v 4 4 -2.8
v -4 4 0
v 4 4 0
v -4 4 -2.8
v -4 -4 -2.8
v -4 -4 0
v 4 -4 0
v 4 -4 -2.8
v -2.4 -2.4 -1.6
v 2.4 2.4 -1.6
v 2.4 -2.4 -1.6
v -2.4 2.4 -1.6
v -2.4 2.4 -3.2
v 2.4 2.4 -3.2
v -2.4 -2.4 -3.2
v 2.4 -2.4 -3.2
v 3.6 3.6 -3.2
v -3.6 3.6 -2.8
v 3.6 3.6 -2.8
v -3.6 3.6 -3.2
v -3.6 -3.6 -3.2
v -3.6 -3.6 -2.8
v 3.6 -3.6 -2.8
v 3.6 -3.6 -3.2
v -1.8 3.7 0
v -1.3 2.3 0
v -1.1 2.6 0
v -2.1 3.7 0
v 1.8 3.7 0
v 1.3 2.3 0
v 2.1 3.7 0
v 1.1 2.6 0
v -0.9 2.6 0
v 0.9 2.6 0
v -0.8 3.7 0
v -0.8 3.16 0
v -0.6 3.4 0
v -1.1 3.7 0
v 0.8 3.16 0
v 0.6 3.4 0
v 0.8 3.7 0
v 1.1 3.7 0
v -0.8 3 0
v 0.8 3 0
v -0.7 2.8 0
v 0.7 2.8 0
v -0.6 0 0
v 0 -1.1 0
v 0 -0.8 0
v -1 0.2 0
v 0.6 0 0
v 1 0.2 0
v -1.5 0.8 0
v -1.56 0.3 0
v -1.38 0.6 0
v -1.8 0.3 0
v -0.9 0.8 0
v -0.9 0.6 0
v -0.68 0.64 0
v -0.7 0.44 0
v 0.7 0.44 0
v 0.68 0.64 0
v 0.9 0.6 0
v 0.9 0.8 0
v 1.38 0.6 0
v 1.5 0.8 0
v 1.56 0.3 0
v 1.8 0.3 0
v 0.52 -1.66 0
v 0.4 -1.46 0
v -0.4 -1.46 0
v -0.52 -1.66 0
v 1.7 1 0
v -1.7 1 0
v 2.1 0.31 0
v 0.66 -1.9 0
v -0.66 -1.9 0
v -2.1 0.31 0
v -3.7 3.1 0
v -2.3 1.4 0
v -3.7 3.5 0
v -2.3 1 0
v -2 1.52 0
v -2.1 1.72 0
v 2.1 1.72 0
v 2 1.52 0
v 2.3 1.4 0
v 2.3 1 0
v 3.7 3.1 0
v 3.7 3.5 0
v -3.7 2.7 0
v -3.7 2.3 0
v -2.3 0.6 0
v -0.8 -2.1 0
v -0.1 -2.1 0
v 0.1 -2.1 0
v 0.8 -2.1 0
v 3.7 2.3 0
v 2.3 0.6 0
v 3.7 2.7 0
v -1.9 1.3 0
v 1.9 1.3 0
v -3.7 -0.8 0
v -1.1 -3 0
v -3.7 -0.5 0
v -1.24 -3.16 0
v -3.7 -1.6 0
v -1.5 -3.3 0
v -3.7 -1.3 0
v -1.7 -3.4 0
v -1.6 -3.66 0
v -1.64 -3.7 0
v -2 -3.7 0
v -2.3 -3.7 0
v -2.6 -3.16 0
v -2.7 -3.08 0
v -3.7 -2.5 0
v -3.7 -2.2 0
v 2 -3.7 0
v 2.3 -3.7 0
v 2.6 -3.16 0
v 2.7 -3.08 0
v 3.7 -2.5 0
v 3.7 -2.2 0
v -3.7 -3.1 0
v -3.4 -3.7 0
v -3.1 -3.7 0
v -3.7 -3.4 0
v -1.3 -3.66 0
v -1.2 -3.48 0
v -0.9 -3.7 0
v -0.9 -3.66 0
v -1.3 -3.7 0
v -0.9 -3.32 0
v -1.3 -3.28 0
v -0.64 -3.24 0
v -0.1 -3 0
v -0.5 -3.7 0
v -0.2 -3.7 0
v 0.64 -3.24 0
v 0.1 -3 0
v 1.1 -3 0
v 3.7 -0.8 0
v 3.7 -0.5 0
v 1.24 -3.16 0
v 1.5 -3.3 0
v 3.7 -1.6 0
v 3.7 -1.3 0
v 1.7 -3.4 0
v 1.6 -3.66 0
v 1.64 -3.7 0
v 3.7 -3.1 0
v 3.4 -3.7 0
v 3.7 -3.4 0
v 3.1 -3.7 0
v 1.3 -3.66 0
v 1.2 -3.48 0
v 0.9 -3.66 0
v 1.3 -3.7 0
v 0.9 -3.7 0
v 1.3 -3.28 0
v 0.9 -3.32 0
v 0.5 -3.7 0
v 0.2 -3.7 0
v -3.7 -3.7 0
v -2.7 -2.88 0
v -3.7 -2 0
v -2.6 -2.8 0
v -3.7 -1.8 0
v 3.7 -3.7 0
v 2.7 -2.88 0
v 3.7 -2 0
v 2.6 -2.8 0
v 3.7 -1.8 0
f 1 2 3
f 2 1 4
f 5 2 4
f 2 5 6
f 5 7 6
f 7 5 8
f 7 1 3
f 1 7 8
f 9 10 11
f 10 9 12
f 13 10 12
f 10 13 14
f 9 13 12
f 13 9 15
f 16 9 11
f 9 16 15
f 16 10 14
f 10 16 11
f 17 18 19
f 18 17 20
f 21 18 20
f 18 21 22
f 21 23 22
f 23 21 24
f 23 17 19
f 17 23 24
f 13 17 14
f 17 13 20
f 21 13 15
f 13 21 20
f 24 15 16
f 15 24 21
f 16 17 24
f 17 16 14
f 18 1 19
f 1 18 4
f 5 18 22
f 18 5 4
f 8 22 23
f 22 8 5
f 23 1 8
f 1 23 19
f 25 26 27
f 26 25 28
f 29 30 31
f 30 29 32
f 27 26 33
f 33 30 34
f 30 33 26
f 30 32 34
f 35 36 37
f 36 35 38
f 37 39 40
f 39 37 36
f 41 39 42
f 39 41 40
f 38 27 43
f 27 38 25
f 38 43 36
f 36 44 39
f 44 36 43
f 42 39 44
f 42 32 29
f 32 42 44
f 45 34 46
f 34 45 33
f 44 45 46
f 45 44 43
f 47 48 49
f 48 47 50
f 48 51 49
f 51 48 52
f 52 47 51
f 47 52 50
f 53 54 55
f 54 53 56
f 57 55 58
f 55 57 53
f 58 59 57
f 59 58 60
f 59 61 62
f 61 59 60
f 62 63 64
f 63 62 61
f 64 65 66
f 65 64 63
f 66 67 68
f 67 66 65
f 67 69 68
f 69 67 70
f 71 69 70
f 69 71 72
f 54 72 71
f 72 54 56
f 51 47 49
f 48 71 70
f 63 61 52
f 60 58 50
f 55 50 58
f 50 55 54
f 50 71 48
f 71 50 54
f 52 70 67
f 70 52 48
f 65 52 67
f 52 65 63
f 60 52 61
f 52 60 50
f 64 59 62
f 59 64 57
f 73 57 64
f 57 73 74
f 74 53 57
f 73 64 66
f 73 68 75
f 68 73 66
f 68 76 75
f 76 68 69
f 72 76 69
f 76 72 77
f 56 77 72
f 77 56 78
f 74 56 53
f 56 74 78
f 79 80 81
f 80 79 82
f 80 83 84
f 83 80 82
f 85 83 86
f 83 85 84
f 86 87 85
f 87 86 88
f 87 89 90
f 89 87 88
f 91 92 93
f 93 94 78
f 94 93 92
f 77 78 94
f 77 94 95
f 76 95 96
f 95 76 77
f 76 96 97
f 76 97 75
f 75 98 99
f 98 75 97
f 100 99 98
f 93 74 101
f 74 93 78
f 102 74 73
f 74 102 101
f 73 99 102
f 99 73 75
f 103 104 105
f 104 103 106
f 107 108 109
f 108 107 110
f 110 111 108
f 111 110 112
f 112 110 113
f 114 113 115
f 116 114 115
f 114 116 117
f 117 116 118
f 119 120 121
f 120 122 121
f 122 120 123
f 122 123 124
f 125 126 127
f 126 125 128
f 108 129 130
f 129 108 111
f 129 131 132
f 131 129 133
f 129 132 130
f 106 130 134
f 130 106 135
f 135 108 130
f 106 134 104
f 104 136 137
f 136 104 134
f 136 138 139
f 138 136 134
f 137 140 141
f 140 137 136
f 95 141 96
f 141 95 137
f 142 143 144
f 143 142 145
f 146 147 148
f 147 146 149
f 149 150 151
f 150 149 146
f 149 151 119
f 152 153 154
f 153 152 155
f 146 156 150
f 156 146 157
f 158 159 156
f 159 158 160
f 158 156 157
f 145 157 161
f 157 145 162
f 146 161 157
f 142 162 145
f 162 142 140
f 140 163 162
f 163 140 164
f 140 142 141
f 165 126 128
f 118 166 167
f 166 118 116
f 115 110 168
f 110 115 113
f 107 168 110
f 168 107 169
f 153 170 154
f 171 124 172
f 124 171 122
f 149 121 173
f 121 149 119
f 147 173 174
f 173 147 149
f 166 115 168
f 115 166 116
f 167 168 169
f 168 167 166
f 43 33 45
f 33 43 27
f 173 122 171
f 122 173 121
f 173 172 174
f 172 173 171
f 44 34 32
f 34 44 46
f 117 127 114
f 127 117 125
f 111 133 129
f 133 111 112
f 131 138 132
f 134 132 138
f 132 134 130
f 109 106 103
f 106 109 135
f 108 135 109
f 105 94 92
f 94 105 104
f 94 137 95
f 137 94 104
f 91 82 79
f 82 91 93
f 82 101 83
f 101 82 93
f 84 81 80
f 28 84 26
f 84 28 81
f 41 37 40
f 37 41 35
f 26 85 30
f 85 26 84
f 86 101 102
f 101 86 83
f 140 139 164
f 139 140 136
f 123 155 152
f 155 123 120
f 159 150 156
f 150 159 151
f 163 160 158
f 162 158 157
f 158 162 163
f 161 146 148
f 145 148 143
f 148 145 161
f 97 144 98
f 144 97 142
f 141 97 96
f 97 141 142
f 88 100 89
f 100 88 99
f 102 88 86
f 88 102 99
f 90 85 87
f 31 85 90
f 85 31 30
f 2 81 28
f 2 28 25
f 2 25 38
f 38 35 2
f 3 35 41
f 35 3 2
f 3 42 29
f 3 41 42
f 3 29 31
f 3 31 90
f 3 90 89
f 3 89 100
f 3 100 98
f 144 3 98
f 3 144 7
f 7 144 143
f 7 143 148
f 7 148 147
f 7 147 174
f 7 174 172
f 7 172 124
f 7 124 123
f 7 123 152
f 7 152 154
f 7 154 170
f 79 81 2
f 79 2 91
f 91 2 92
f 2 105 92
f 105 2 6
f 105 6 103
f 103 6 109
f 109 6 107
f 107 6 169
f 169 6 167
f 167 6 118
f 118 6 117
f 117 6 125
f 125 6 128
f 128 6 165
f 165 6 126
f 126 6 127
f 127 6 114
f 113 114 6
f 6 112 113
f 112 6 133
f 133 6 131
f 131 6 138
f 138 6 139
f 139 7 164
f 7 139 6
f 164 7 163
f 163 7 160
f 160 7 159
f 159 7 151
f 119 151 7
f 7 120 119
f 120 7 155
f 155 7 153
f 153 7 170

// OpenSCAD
// file: ../p/box5.scad
use <../lib.scad>
function ldraw_lib__box5() = [
// 0 Box with 5 Faces and All Edges
// 0 Name: box5.dat
// 0 Author: James Jessiman
// 0 !LDRAW_ORG Primitive UPDATE 2012-01
// 0 !LICENSE Licensed under CC BY 2.0 and CC BY 4.0 : see CAreadme.txt
// 
// 0 BFC CERTIFY CCW
  [0,"BFC","CERTIFY"],
  [0,"BFC","CCW"],
// 
// 0 !HISTORY 2002-04-03 [sbliss] Modified for BFC compliance
// 0 !HISTORY 2002-04-25 [PTadmin] Official Update 2002-02
// 0 !HISTORY 2007-06-24 [PTadmin] Header formatted for Contributor Agreement
// 0 !HISTORY 2008-07-01 [PTadmin] Official Update 2008-01
// 0 !HISTORY 2012-02-16 [Philo] Changed to CCW
// 0 !HISTORY 2012-03-30 [PTadmin] Official Update 2012-01
// 
// 
// 2 24 1 1 1 -1 1 1
  [2,24,1,1,1,-1,1,1],
// 2 24 -1 1 1 -1 1 -1
  [2,24,-1,1,1,-1,1,-1],
// 2 24 -1 1 -1 1 1 -1
  [2,24,-1,1,-1,1,1,-1],
// 2 24 1 1 -1 1 1 1
  [2,24,1,1,-1,1,1,1],
// 2 24 1 0 1 -1 0 1
  [2,24,1,0,1,-1,0,1],
// 2 24 -1 0 1 -1 0 -1
  [2,24,-1,0,1,-1,0,-1],
// 2 24 -1 0 -1 1 0 -1
  [2,24,-1,0,-1,1,0,-1],
// 2 24 1 0 -1 1 0 1
  [2,24,1,0,-1,1,0,1],
// 2 24 1 0 1 1 1 1
  [2,24,1,0,1,1,1,1],
// 2 24 -1 0 1 -1 1 1
  [2,24,-1,0,1,-1,1,1],
// 2 24 1 0 -1 1 1 -1
  [2,24,1,0,-1,1,1,-1],
// 2 24 -1 0 -1 -1 1 -1
  [2,24,-1,0,-1,-1,1,-1],
// 4 16 -1 1 1 1 1 1 1 1 -1 -1 1 -1
  [4,16,-1,1,1,1,1,1,1,1,-1,-1,1,-1],
// 4 16 -1 1 1 -1 0 1 1 0 1 1 1 1
  [4,16,-1,1,1,-1,0,1,1,0,1,1,1,1],
// 4 16 -1 1 -1 -1 0 -1 -1 0 1 -1 1 1
  [4,16,-1,1,-1,-1,0,-1,-1,0,1,-1,1,1],
// 4 16 1 1 -1 1 0 -1 -1 0 -1 -1 1 -1
  [4,16,1,1,-1,1,0,-1,-1,0,-1,-1,1,-1],
// 4 16 1 1 1 1 0 1 1 0 -1 1 1 -1
  [4,16,1,1,1,1,0,1,1,0,-1,1,1,-1],
];
makepoly(ldraw_lib__box5(), line=0.2);
// file: ../p/box4.scad
use <../lib.scad>
function ldraw_lib__box4() = [
// 0 Box with 4 Faces (2 Parallel Pairs) and All Edges
// 0 Name: box4.dat
// 0 Author: James Jessiman
// 0 !LDRAW_ORG Primitive UPDATE 2012-01
// 0 !LICENSE Licensed under CC BY 2.0 and CC BY 4.0 : see CAreadme.txt
// 
// 0 BFC CERTIFY CCW
  [0,"BFC","CERTIFY"],
  [0,"BFC","CCW"],
// 
// 0 !HISTORY 2002-04-03 [sbliss] Modified for BFC compliance
// 0 !HISTORY 2002-04-25 [PTadmin] Official Update 2002-02
// 0 !HISTORY 2007-06-24 [PTadmin] Header formatted for Contributor Agreement
// 0 !HISTORY 2008-07-01 [PTadmin] Official Update 2008-01
// 0 !HISTORY 2012-02-16 [Philo] Changed to CCW
// 0 !HISTORY 2012-03-30 [PTadmin] Official Update 2012-01
// 
// 
// 2 24 1 1 1 -1 1 1
  [2,24,1,1,1,-1,1,1],
// 2 24 -1 1 1 -1 1 -1
  [2,24,-1,1,1,-1,1,-1],
// 2 24 -1 1 -1 1 1 -1
  [2,24,-1,1,-1,1,1,-1],
// 2 24 1 1 -1 1 1 1
  [2,24,1,1,-1,1,1,1],
// 2 24 1 0 1 -1 0 1
  [2,24,1,0,1,-1,0,1],
// 2 24 -1 0 1 -1 0 -1
  [2,24,-1,0,1,-1,0,-1],
// 2 24 -1 0 -1 1 0 -1
  [2,24,-1,0,-1,1,0,-1],
// 2 24 1 0 -1 1 0 1
  [2,24,1,0,-1,1,0,1],
// 2 24 1 0 1 1 1 1
  [2,24,1,0,1,1,1,1],
// 2 24 -1 0 1 -1 1 1
  [2,24,-1,0,1,-1,1,1],
// 2 24 1 0 -1 1 1 -1
  [2,24,1,0,-1,1,1,-1],
// 2 24 -1 0 -1 -1 1 -1
  [2,24,-1,0,-1,-1,1,-1],
// 4 16 -1 1 1 -1 0 1 1 0 1 1 1 1
  [4,16,-1,1,1,-1,0,1,1,0,1,1,1,1],
// 4 16 -1 1 -1 -1 0 -1 -1 0 1 -1 1 1
  [4,16,-1,1,-1,-1,0,-1,-1,0,1,-1,1,1],
// 4 16 1 1 -1 1 0 -1 -1 0 -1 -1 1 -1
  [4,16,1,1,-1,1,0,-1,-1,0,-1,-1,1,-1],
// 4 16 1 1 1 1 0 1 1 0 -1 1 1 -1
  [4,16,1,1,1,1,0,1,1,0,-1,1,1,-1],
];
makepoly(ldraw_lib__box4(), line=0.2);
// file: s/3070bs01.scad
use <../../lib.scad>
use <../../p/box4.scad>
use <../../p/box5.scad>
function ldraw_lib__s__3070bs01() = [
// 0 ~Tile  1 x  1 with Groove without Top Face
// 0 Name: s\3070bs01.dat
// 0 Author: Chris Dee [cwdee]
// 0 !LDRAW_ORG Subpart UPDATE 2009-02
// 0 !LICENSE Licensed under CC BY 2.0 and CC BY 4.0 : see CAreadme.txt
// 
// 0 BFC CERTIFY CCW
  [0,"BFC","CERTIFY"],
  [0,"BFC","CCW"],
// 
// 0 !HISTORY 2009-09-03 [PTadmin] Official Update 2009-02
// 
// 
// 1 16 0 0 0 10 0 0 0 7 0 0 0 10 box4.dat
  [1,16,0,0,0,10,0,0,0,7,0,0,0,10, ldraw_lib__box4()],
// 0 BFC INVERTNEXT
  [0,"BFC","INVERTNEXT"],
// 1 16 0 8 0 6 0 0 0 -4 0 0 0 6 box5.dat
  [1,16,0,8,0,6,0,0,0,-4,0,0,0,6, ldraw_lib__box5()],
// 1 16 0 7 0 9 0 0 0 1 0 0 0 9 box4.dat
  [1,16,0,7,0,9,0,0,0,1,0,0,0,9, ldraw_lib__box4()],
// 
// 4 16 9 8 9 6 8 6 -6 8 6 -9 8 9
  [4,16,9,8,9,6,8,6,-6,8,6,-9,8,9],
// 4 16 -9 8 9 -6 8 6 -6 8 -6 -9 8 -9
  [4,16,-9,8,9,-6,8,6,-6,8,-6,-9,8,-9],
// 4 16 -9 8 -9 -6 8 -6 6 8 -6 9 8 -9
  [4,16,-9,8,-9,-6,8,-6,6,8,-6,9,8,-9],
// 4 16 9 8 -9 6 8 -6 6 8 6 9 8 9
  [4,16,9,8,-9,6,8,-6,6,8,6,9,8,9],
// 
// 4 16 10 7 10 9 7 9 -9 7 9 -10 7 10
  [4,16,10,7,10,9,7,9,-9,7,9,-10,7,10],
// 4 16 -10 7 10 -9 7 9 -9 7 -9 -10 7 -10
  [4,16,-10,7,10,-9,7,9,-9,7,-9,-10,7,-10],
// 4 16 -10 7 -10 -9 7 -9 9 7 -9 10 7 -10
  [4,16,-10,7,-10,-9,7,-9,9,7,-9,10,7,-10],
// 4 16 10 7 -10 9 7 -9 9 7 9 10 7 10
  [4,16,10,7,-10,9,7,-9,9,7,9,10,7,10],
// 0
];
makepoly(ldraw_lib__s__3070bs01(), line=0.2);
// main file
use <../lib.scad>
use <s/3070bs01.scad>
function ldraw_lib__3070bpb0() = [
// 0 Tile  1 x  1 with Iron Man Armour and White Hexagonal Reactor Pattern
// 0 Name: 3070bpb0.dat
// 0 Author: Vincent Messenet [Cheenzo]
// 0 !LDRAW_ORG Part UPDATE 2020-03
// 0 !LICENSE Licensed under CC BY 2.0 and CC BY 4.0 : see CAreadme.txt
// 
// 0 BFC CERTIFY CCW
  [0,"BFC","CERTIFY"],
  [0,"BFC","CCW"],
// 
// 0 !KEYWORDS Armor, BrickLink 3070bpb094, Mark 33, MK XXXIII, Mk33, Set 5002946
// 0 !KEYWORDS Silver Centurion
// 
// 0 !HISTORY 2019-09-09 [PTadmin] Official Update 2019-02
// 0 !HISTORY 2020-11-14 [cwdee] Update description
// 0 !HISTORY 2020-12-29 [PTadmin] Official Update 2020-03
// 
// 
// 1 16 0 0 0 1 0 0 0 1 0 0 0 1 s\3070bs01.dat
  [1,16,0,0,0,1,0,0,0,1,0,0,0,1, ldraw_lib__s__3070bs01()],
// 
// 4 0 -2.75 0 6.5 -4.5 0 9.25 -5.25 0 9.25 -3.25 0 5.75
  [4,0,-2.75,0,6.5,-4.5,0,9.25,-5.25,0,9.25,-3.25,0,5.75],
// 4 0 5.25 0 9.25 4.5 0 9.25 2.75 0 6.5 3.25 0 5.75
  [4,0,5.25,0,9.25,4.5,0,9.25,2.75,0,6.5,3.25,0,5.75],
// 3 0 -2.75 0 6.5 -3.25 0 5.75 -2.25 0 6.5
  [3,0,-2.75,0,6.5,-3.25,0,5.75,-2.25,0,6.5],
// 4 0 2.25 0 6.5 -2.25 0 6.5 -3.25 0 5.75 3.25 0 5.75
  [4,0,2.25,0,6.5,-2.25,0,6.5,-3.25,0,5.75,3.25,0,5.75],
// 3 0 3.25 0 5.75 2.75 0 6.5 2.25 0 6.5
  [3,0,3.25,0,5.75,2.75,0,6.5,2.25,0,6.5],
// 4 0 -1.5 0 8.5 -2 0 9.25 -2.75 0 9.25 -2 0 7.9
  [4,0,-1.5,0,8.5,-2,0,9.25,-2.75,0,9.25,-2,0,7.9],
// 4 0 1.5 0 8.5 -1.5 0 8.5 -2 0 7.9 2 0 7.9
  [4,0,1.5,0,8.5,-1.5,0,8.5,-2,0,7.9,2,0,7.9],
// 4 0 1.5 0 8.5 2 0 7.9 2.75 0 9.25 2 0 9.25
  [4,0,1.5,0,8.5,2,0,7.9,2.75,0,9.25,2,0,9.25],
// 
// 4 71 -2 0 7.5 -2.75 0 9.25 -4.5 0 9.25 -2.75 0 6.5
  [4,71,-2,0,7.5,-2.75,0,9.25,-4.5,0,9.25,-2.75,0,6.5],
// 3 71 -2.75 0 9.25 -2 0 7.5 -2 0 7.9
  [3,71,-2.75,0,9.25,-2,0,7.5,-2,0,7.9],
// 4 71 -2 0 7.5 2 0 7.5 2 0 7.9 -2 0 7.9
  [4,71,-2,0,7.5,2,0,7.5,2,0,7.9,-2,0,7.9],
// 3 71 2.75 0 9.25 2 0 7.9 2 0 7.5
  [3,71,2.75,0,9.25,2,0,7.9,2,0,7.5],
// 4 71 2.75 0 9.25 2 0 7.5 2.75 0 6.5 4.5 0 9.25
  [4,71,2.75,0,9.25,2,0,7.5,2.75,0,6.5,4.5,0,9.25],
// 4 71 1.75 0 7 -1.75 0 7 -2.25 0 6.5 2.25 0 6.5
  [4,71,1.75,0,7,-1.75,0,7,-2.25,0,6.5,2.25,0,6.5],
// 
// 4 72 -2 0 7.5 -1.75 0 7 1.75 0 7 2 0 7.5
  [4,72,-2,0,7.5,-1.75,0,7,1.75,0,7,2,0,7.5],
// 
// 4 80 0 0 -2 -1.5 0 0 -2.5 0 .5 0 0 -2.75
  [4,80,0,0,-2,-1.5,0,0,-2.5,0,.5,0,0,-2.75],
// 4 80 1.5 0 0 0 0 -2 0 0 -2.75 2.5 0 .5
  [4,80,1.5,0,0,0,0,-2,0,0,-2.75,2.5,0,.5],
// 4 80 -1.5 0 0 1.5 0 0 2.5 0 .5 -2.5 0 .5
  [4,80,-1.5,0,0,1.5,0,0,2.5,0,.5,-2.5,0,.5],
// 4 80 -4.5 0 .75 -3.9 0 .75 -3.45 0 1.5 -3.75 0 2
  [4,80,-4.5,0,.75,-3.9,0,.75,-3.45,0,1.5,-3.75,0,2],
// 4 80 -3.75 0 2 -3.45 0 1.5 -2.25 0 1.5 -2.25 0 2
  [4,80,-3.75,0,2,-3.45,0,1.5,-2.25,0,1.5,-2.25,0,2],
// 4 80 -1.7 0 1.6 -2.25 0 2 -2.25 0 1.5 -1.75 0 1.1
  [4,80,-1.7,0,1.6,-2.25,0,2,-2.25,0,1.5,-1.75,0,1.1],
// 4 80 1.7 0 1.6 -1.7 0 1.6 -1.75 0 1.1 1.75 0 1.1
  [4,80,1.7,0,1.6,-1.7,0,1.6,-1.75,0,1.1,1.75,0,1.1],
// 4 80 1.7 0 1.6 1.75 0 1.1 2.25 0 1.5 2.25 0 2
  [4,80,1.7,0,1.6,1.75,0,1.1,2.25,0,1.5,2.25,0,2],
// 4 80 2.25 0 2 2.25 0 1.5 3.45 0 1.5 3.75 0 2
  [4,80,2.25,0,2,2.25,0,1.5,3.45,0,1.5,3.75,0,2],
// 4 80 3.75 0 2 3.45 0 1.5 3.9 0 .75 4.5 0 .75
  [4,80,3.75,0,2,3.45,0,1.5,3.9,0,.75,4.5,0,.75],
// 4 80 4.5 0 .75 3.9 0 .75 1 0 -3.65 1.3 0 -4.15
  [4,80,4.5,0,.75,3.9,0,.75,1,0,-3.65,1.3,0,-4.15],
// 4 80 -1.3 0 -4.15 1.3 0 -4.15 1 0 -3.65 -1 0 -3.65
  [4,80,-1.3,0,-4.15,1.3,0,-4.15,1,0,-3.65,-1,0,-3.65],
// 4 80 -1.3 0 -4.15 -1 0 -3.65 -3.9 0 .75 -4.5 0 .75
  [4,80,-1.3,0,-4.15,-1,0,-3.65,-3.9,0,.75,-4.5,0,.75],
// 
// 3 15 1.5 0 0 -1.5 0 0 0 0 -2
  [3,15,1.5,0,0,-1.5,0,0,0,0,-2],
// 3 15 0 0 -2.75 -1 0 -3.65 1 0 -3.65
  [3,15,0,0,-2.75,-1,0,-3.65,1,0,-3.65],
// 3 15 2.25 0 1.5 1.75 0 1.1 2.5 0 .5
  [3,15,2.25,0,1.5,1.75,0,1.1,2.5,0,.5],
// 3 15 -1.75 0 1.1 -2.25 0 1.5 -2.5 0 .5
  [3,15,-1.75,0,1.1,-2.25,0,1.5,-2.5,0,.5],
// 4 15 -2.25 0 1.5 -3.45 0 1.5 -3.9 0 .75 -2.5 0 .5
  [4,15,-2.25,0,1.5,-3.45,0,1.5,-3.9,0,.75,-2.5,0,.5],
// 4 15 0 0 -2.75 -2.5 0 .5 -3.9 0 .75 -1 0 -3.65
  [4,15,0,0,-2.75,-2.5,0,.5,-3.9,0,.75,-1,0,-3.65],
// 4 15 0 0 -2.75 1 0 -3.65 3.9 0 .75 2.5 0 .5
  [4,15,0,0,-2.75,1,0,-3.65,3.9,0,.75,2.5,0,.5],
// 4 15 2.5 0 .5 3.9 0 .75 3.45 0 1.5 2.25 0 1.5
  [4,15,2.5,0,.5,3.9,0,.75,3.45,0,1.5,2.25,0,1.5],
// 4 15 2.5 0 .5 1.75 0 1.1 -1.75 0 1.1 -2.5 0 .5
  [4,15,2.5,0,.5,1.75,0,1.1,-1.75,0,1.1,-2.5,0,.5],
// 4 15 -2.25 0 2 -1.7 0 1.6 1.7 0 1.6 2.25 0 2
  [4,15,-2.25,0,2,-1.7,0,1.6,1.7,0,1.6,2.25,0,2],
// 4 15 -4.25 0 2.5 -2.25 0 2 2.25 0 2 4.25 0 2.5
  [4,15,-4.25,0,2.5,-2.25,0,2,2.25,0,2,4.25,0,2.5],
// 3 15 -4.25 0 2.5 -3.75 0 2 -2.25 0 2
  [3,15,-4.25,0,2.5,-3.75,0,2,-2.25,0,2],
// 3 15 4.25 0 2.5 2.25 0 2 3.75 0 2
  [3,15,4.25,0,2.5,2.25,0,2,3.75,0,2],
// 4 15 4.25 0 2.5 3.75 0 2 4.5 0 .75 5.25 0 .775
  [4,15,4.25,0,2.5,3.75,0,2,4.5,0,.75,5.25,0,.775],
// 4 15 5.25 0 .775 4.5 0 .75 1.3 0 -4.15 1.65 0 -4.75
  [4,15,5.25,0,.775,4.5,0,.75,1.3,0,-4.15,1.65,0,-4.75],
// 4 15 -1.65 0 -4.75 1.65 0 -4.75 1.3 0 -4.15 -1.3 0 -4.15
  [4,15,-1.65,0,-4.75,1.65,0,-4.75,1.3,0,-4.15,-1.3,0,-4.15],
// 4 15 -1.65 0 -4.75 -1.3 0 -4.15 -4.5 0 .75 -5.25 0 .775
  [4,15,-1.65,0,-4.75,-1.3,0,-4.15,-4.5,0,.75,-5.25,0,.775],
// 4 15 -5.25 0 .775 -4.5 0 .75 -3.75 0 2 -4.25 0 2.5
  [4,15,-5.25,0,.775,-4.5,0,.75,-3.75,0,2,-4.25,0,2.5],
// 
// 4 0 -9.25 0 8.75 -9.25 0 7.75 -5.75 0 2.5 -5.75 0 3.5
  [4,0,-9.25,0,8.75,-9.25,0,7.75,-5.75,0,2.5,-5.75,0,3.5],
// 4 0 -5.25 0 4.3 -5.75 0 3.5 -5.75 0 2.5 -5 0 3.8
  [4,0,-5.25,0,4.3,-5.75,0,3.5,-5.75,0,2.5,-5,0,3.8],
// 4 0 -5.25 0 4.3 -5 0 3.8 5 0 3.8 5.25 0 4.3
  [4,0,-5.25,0,4.3,-5,0,3.8,5,0,3.8,5.25,0,4.3],
// 4 0 5.75 0 3.5 5.25 0 4.3 5 0 3.8 5.75 0 2.5
  [4,0,5.75,0,3.5,5.25,0,4.3,5,0,3.8,5.75,0,2.5],
// 4 0 5.75 0 2.5 9.25 0 7.75 9.25 0 8.75 5.75 0 3.5
  [4,0,5.75,0,2.5,9.25,0,7.75,9.25,0,8.75,5.75,0,3.5],
// 3 0 -9.25 0 6.75 -9.25 0 5.75 -5.75 0 1.5
  [3,0,-9.25,0,6.75,-9.25,0,5.75,-5.75,0,1.5],
// 4 0 -5.25 0 .775 -5.75 0 1.5 -9.25 0 5.75 -2 0 -5.25
  [4,0,-5.25,0,.775,-5.75,0,1.5,-9.25,0,5.75,-2,0,-5.25],
// 3 0 -1.65 0 -4.75 -5.25 0 .775 -2 0 -5.25
  [3,0,-1.65,0,-4.75,-5.25,0,.775,-2,0,-5.25],
// 3 0 -1.65 0 -4.75 -2 0 -5.25 -.25 0 -5.25
  [3,0,-1.65,0,-4.75,-2,0,-5.25,-.25,0,-5.25],
// 4 0 -1.65 0 -4.75 -.25 0 -5.25 .25 0 -5.25 1.65 0 -4.75
  [4,0,-1.65,0,-4.75,-.25,0,-5.25,.25,0,-5.25,1.65,0,-4.75],
// 3 0 1.65 0 -4.75 .25 0 -5.25 2 0 -5.25
  [3,0,1.65,0,-4.75,.25,0,-5.25,2,0,-5.25],
// 3 0 1.65 0 -4.75 2 0 -5.25 5.25 0 .775
  [3,0,1.65,0,-4.75,2,0,-5.25,5.25,0,.775],
// 4 0 5.75 0 1.5 5.25 0 .775 2 0 -5.25 9.25 0 5.75
  [4,0,5.75,0,1.5,5.25,0,.775,2,0,-5.25,9.25,0,5.75],
// 3 0 9.25 0 6.75 5.75 0 1.5 9.25 0 5.75
  [3,0,9.25,0,6.75,5.75,0,1.5,9.25,0,5.75],
// 4 0 -4.75 0 3.25 -5.75 0 1.5 -5.25 0 .775 -4.25 0 2.5
  [4,0,-4.75,0,3.25,-5.75,0,1.5,-5.25,0,.775,-4.25,0,2.5],
// 4 0 -4.75 0 3.25 -4.25 0 2.5 4.25 0 2.5 4.75 0 3.25
  [4,0,-4.75,0,3.25,-4.25,0,2.5,4.25,0,2.5,4.75,0,3.25],
// 4 0 4.25 0 2.5 5.25 0 .775 5.75 0 1.5 4.75 0 3.25
  [4,0,4.25,0,2.5,5.25,0,.775,5.75,0,1.5,4.75,0,3.25],
// 4 0 -9.25 0 -1.25 -9.25 0 -2 -3.1 0 -7.9 -2.75 0 -7.5
  [4,0,-9.25,0,-1.25,-9.25,0,-2,-3.1,0,-7.9,-2.75,0,-7.5],
// 4 0 -9.25 0 -3.25 -9.25 0 -4 -4.25 0 -8.5 -3.75 0 -8.25
  [4,0,-9.25,0,-3.25,-9.25,0,-4,-4.25,0,-8.5,-3.75,0,-8.25],
// 4 0 -4.1 0 -9.25 -4 0 -9.15 -3.75 0 -8.25 -4.25 0 -8.5
  [4,0,-4.1,0,-9.25,-4,0,-9.15,-3.75,0,-8.25,-4.25,0,-8.5],
// 3 0 -4.1 0 -9.25 -4.25 0 -8.5 -5 0 -9.25
  [3,0,-4.1,0,-9.25,-4.25,0,-8.5,-5,0,-9.25],
// 3 0 -5.75 0 -9.25 -5 0 -9.25 -6.5 0 -7.9
  [3,0,-5.75,0,-9.25,-5,0,-9.25,-6.5,0,-7.9],
// 4 0 -9.25 0 -6.25 -5.75 0 -9.25 -6.5 0 -7.9 -6.75 0 -7.7
  [4,0,-9.25,0,-6.25,-5.75,0,-9.25,-6.5,0,-7.9,-6.75,0,-7.7],
// 3 0 -9.25 0 -6.25 -6.75 0 -7.7 -9.25 0 -5.5
  [3,0,-9.25,0,-6.25,-6.75,0,-7.7,-9.25,0,-5.5],
// 3 0 5 0 -9.25 5.75 0 -9.25 6.5 0 -7.9
  [3,0,5,0,-9.25,5.75,0,-9.25,6.5,0,-7.9],
// 4 0 6.5 0 -7.9 5.75 0 -9.25 9.25 0 -6.25 6.75 0 -7.7
  [4,0,6.5,0,-7.9,5.75,0,-9.25,9.25,0,-6.25,6.75,0,-7.7],
// 3 0 6.75 0 -7.7 9.25 0 -6.25 9.25 0 -5.5
  [3,0,6.75,0,-7.7,9.25,0,-6.25,9.25,0,-5.5],
// 4 0 -7.75 0 -9.25 -9.25 0 -7.75 -9.25 0 -8.5 -8.5 0 -9.25
  [4,0,-7.75,0,-9.25,-9.25,0,-7.75,-9.25,0,-8.5,-8.5,0,-9.25],
// 4 0 -3 0 -8.7 -3.75 0 -8.25 -4 0 -9.15 -3.25 0 -9.15
  [4,0,-3,0,-8.7,-3.75,0,-8.25,-4,0,-9.15,-3.25,0,-9.15],
// 4 0 -3.25 0 -9.15 -3.25 0 -9.25 -2.25 0 -9.25 -2.25 0 -9.15
  [4,0,-3.25,0,-9.15,-3.25,0,-9.25,-2.25,0,-9.25,-2.25,0,-9.15],
// 3 0 -3.25 0 -9.15 -2.25 0 -9.15 -3 0 -8.7
  [3,0,-3.25,0,-9.15,-2.25,0,-9.15,-3,0,-8.7],
// 4 0 -3.1 0 -7.9 -3.25 0 -8.2 -3 0 -8.7 -2.25 0 -8.3
  [4,0,-3.1,0,-7.9,-3.25,0,-8.2,-3,0,-8.7,-2.25,0,-8.3],
// 3 0 -3.25 0 -8.2 -3.75 0 -8.25 -3 0 -8.7
  [3,0,-3.25,0,-8.2,-3.75,0,-8.25,-3,0,-8.7],
// 3 0 -3.1 0 -7.9 -2.25 0 -8.3 -2.75 0 -7.5
  [3,0,-3.1,0,-7.9,-2.25,0,-8.3,-2.75,0,-7.5],
// 4 0 -.25 0 -7.5 -2.75 0 -7.5 -2.25 0 -8.3 -1.6 0 -8.1
  [4,0,-.25,0,-7.5,-2.75,0,-7.5,-2.25,0,-8.3,-1.6,0,-8.1],
// 4 0 -.5 0 -9.25 -1.6 0 -8.1 -2.25 0 -8.3 -1.25 0 -9.25
  [4,0,-.5,0,-9.25,-1.6,0,-8.1,-2.25,0,-8.3,-1.25,0,-9.25],
// 4 0 .25 0 -7.5 -.25 0 -7.5 -1.6 0 -8.1 1.6 0 -8.1
  [4,0,.25,0,-7.5,-.25,0,-7.5,-1.6,0,-8.1,1.6,0,-8.1],
// 4 0 -.25 0 -5.25 -.25 0 -7.5 .25 0 -7.5 .25 0 -5.25
  [4,0,-.25,0,-5.25,-.25,0,-7.5,.25,0,-7.5,.25,0,-5.25],
// 4 0 3.1 0 -7.9 9.25 0 -2 9.25 0 -1.25 2.75 0 -7.5
  [4,0,3.1,0,-7.9,9.25,0,-2,9.25,0,-1.25,2.75,0,-7.5],
// 4 0 4.25 0 -8.5 9.25 0 -4 9.25 0 -3.25 3.75 0 -8.25
  [4,0,4.25,0,-8.5,9.25,0,-4,9.25,0,-3.25,3.75,0,-8.25],
// 4 0 3.75 0 -8.25 4 0 -9.15 4.1 0 -9.25 4.25 0 -8.5
  [4,0,3.75,0,-8.25,4,0,-9.15,4.1,0,-9.25,4.25,0,-8.5],
// 3 0 4.25 0 -8.5 4.1 0 -9.25 5 0 -9.25
  [3,0,4.25,0,-8.5,4.1,0,-9.25,5,0,-9.25],
// 4 0 9.25 0 -8.5 9.25 0 -7.75 7.75 0 -9.25 8.5 0 -9.25
  [4,0,9.25,0,-8.5,9.25,0,-7.75,7.75,0,-9.25,8.5,0,-9.25],
// 4 0 4 0 -9.15 3.75 0 -8.25 3 0 -8.7 3.25 0 -9.15
  [4,0,4,0,-9.15,3.75,0,-8.25,3,0,-8.7,3.25,0,-9.15],
// 4 0 2.25 0 -9.25 3.25 0 -9.25 3.25 0 -9.15 2.25 0 -9.15
  [4,0,2.25,0,-9.25,3.25,0,-9.25,3.25,0,-9.15,2.25,0,-9.15],
// 3 0 2.25 0 -9.15 3.25 0 -9.15 3 0 -8.7
  [3,0,2.25,0,-9.15,3.25,0,-9.15,3,0,-8.7],
// 4 0 3 0 -8.7 3.25 0 -8.2 3.1 0 -7.9 2.25 0 -8.3
  [4,0,3,0,-8.7,3.25,0,-8.2,3.1,0,-7.9,2.25,0,-8.3],
// 3 0 3.75 0 -8.25 3.25 0 -8.2 3 0 -8.7
  [3,0,3.75,0,-8.25,3.25,0,-8.2,3,0,-8.7],
// 4 0 3.1 0 -7.9 2.75 0 -7.5 1.6 0 -8.1 2.25 0 -8.3
  [4,0,3.1,0,-7.9,2.75,0,-7.5,1.6,0,-8.1,2.25,0,-8.3],
// 4 0 2.25 0 -8.3 1.6 0 -8.1 .5 0 -9.25 1.25 0 -9.25
  [4,0,2.25,0,-8.3,1.6,0,-8.1,.5,0,-9.25,1.25,0,-9.25],
// 3 0 1.6 0 -8.1 2.75 0 -7.5 .25 0 -7.5
  [3,0,1.6,0,-8.1,2.75,0,-7.5,.25,0,-7.5],
// 
// 3 71 -9.25 0 -9.25 -8.5 0 -9.25 -9.25 0 -8.5
  [3,71,-9.25,0,-9.25,-8.5,0,-9.25,-9.25,0,-8.5],
// 4 71 -9.25 0 -5 -9.25 0 -5.5 -6.75 0 -7.7 -6.75 0 -7.2
  [4,71,-9.25,0,-5,-9.25,0,-5.5,-6.75,0,-7.7,-6.75,0,-7.2],
// 4 71 -6.5 0 -7 -6.5 0 -7.9 -5 0 -9.25 -4.25 0 -8.5
  [4,71,-6.5,0,-7,-6.5,0,-7.9,-5,0,-9.25,-4.25,0,-8.5],
// 4 71 -9.25 0 -4 -9.25 0 -4.5 -6.5 0 -7 -4.25 0 -8.5
  [4,71,-9.25,0,-4,-9.25,0,-4.5,-6.5,0,-7,-4.25,0,-8.5],
// 3 71 8.5 0 -9.25 9.25 0 -9.25 9.25 0 -8.5
  [3,71,8.5,0,-9.25,9.25,0,-9.25,9.25,0,-8.5],
// 4 71 6.75 0 -7.7 9.25 0 -5.5 9.25 0 -5 6.75 0 -7.2
  [4,71,6.75,0,-7.7,9.25,0,-5.5,9.25,0,-5,6.75,0,-7.2],
// 4 71 5 0 -9.25 6.5 0 -7.9 6.5 0 -7 4.25 0 -8.5
  [4,71,5,0,-9.25,6.5,0,-7.9,6.5,0,-7,4.25,0,-8.5],
// 4 71 6.5 0 -7 9.25 0 -4.5 9.25 0 -4 4.25 0 -8.5
  [4,71,6.5,0,-7,9.25,0,-4.5,9.25,0,-4,4.25,0,-8.5],
// 
// 4 72 -6.5 0 -7 -6.75 0 -7.2 -6.75 0 -7.7 -6.5 0 -7.9
  [4,72,-6.5,0,-7,-6.75,0,-7.2,-6.75,0,-7.7,-6.5,0,-7.9],
// 4 72 -9.25 0 -5 -6.75 0 -7.2 -6.5 0 -7 -9.25 0 -4.5
  [4,72,-9.25,0,-5,-6.75,0,-7.2,-6.5,0,-7,-9.25,0,-4.5],
// 4 72 -2 0 7.5 -2.75 0 6.5 -2.25 0 6.5 -1.75 0 7
  [4,72,-2,0,7.5,-2.75,0,6.5,-2.25,0,6.5,-1.75,0,7],
// 4 72 6.75 0 -7.7 6.75 0 -7.2 6.5 0 -7 6.5 0 -7.9
  [4,72,6.75,0,-7.7,6.75,0,-7.2,6.5,0,-7,6.5,0,-7.9],
// 4 72 6.5 0 -7 6.75 0 -7.2 9.25 0 -5 9.25 0 -4.5
  [4,72,6.5,0,-7,6.75,0,-7.2,9.25,0,-5,9.25,0,-4.5],
// 4 72 2 0 7.5 1.75 0 7 2.25 0 6.5 2.75 0 6.5
  [4,72,2,0,7.5,1.75,0,7,2.25,0,6.5,2.75,0,6.5],
// 
// 4 16 -9.25 0 -7.75 -7.75 0 -9.25 -5.75 0 -9.25 -9.25 0 -6.25
  [4,16,-9.25,0,-7.75,-7.75,0,-9.25,-5.75,0,-9.25,-9.25,0,-6.25],
// 4 16 -3.25 0 -9.15 -4 0 -9.15 -4.1 0 -9.25 -3.25 0 -9.25
  [4,16,-3.25,0,-9.15,-4,0,-9.15,-4.1,0,-9.25,-3.25,0,-9.25],
// 3 16 -2.25 0 -9.25 -1.25 0 -9.25 -2.25 0 -9.15
  [3,16,-2.25,0,-9.25,-1.25,0,-9.25,-2.25,0,-9.15],
// 4 16 -3 0 -8.7 -2.25 0 -9.15 -1.25 0 -9.25 -2.25 0 -8.3
  [4,16,-3,0,-8.7,-2.25,0,-9.15,-1.25,0,-9.25,-2.25,0,-8.3],
// 4 16 -3.1 0 -7.9 -9.25 0 -2 -9.25 0 -3.25 -3.25 0 -8.2
  [4,16,-3.1,0,-7.9,-9.25,0,-2,-9.25,0,-3.25,-3.25,0,-8.2],
// 3 16 -3.75 0 -8.25 -3.25 0 -8.2 -9.25 0 -3.25
  [3,16,-3.75,0,-8.25,-3.25,0,-8.2,-9.25,0,-3.25],
// 4 16 -9.25 0 5.75 -9.25 0 -1.25 -2.75 0 -7.5 -2 0 -5.25
  [4,16,-9.25,0,5.75,-9.25,0,-1.25,-2.75,0,-7.5,-2,0,-5.25],
// 4 16 -.25 0 -5.25 -2 0 -5.25 -2.75 0 -7.5 -.25 0 -7.5
  [4,16,-.25,0,-5.25,-2,0,-5.25,-2.75,0,-7.5,-.25,0,-7.5],
// 4 16 -5.75 0 2.5 -9.25 0 7.75 -9.25 0 6.75 -5.75 0 1.5
  [4,16,-5.75,0,2.5,-9.25,0,7.75,-9.25,0,6.75,-5.75,0,1.5],
// 4 16 -5 0 3.8 -5.75 0 2.5 -5.75 0 1.5 -4.75 0 3.25
  [4,16,-5,0,3.8,-5.75,0,2.5,-5.75,0,1.5,-4.75,0,3.25],
// 3 16 -5.25 0 4.3 -9.25 0 8.75 -5.75 0 3.5
  [3,16,-5.25,0,4.3,-9.25,0,8.75,-5.75,0,3.5],
// 4 16 -5.25 0 9.25 -9.25 0 8.75 -5.25 0 4.3 -3.25 0 5.75
  [4,16,-5.25,0,9.25,-9.25,0,8.75,-5.25,0,4.3,-3.25,0,5.75],
// 4 16 -2 0 9.25 -1.5 0 8.5 1.5 0 8.5 2 0 9.25
  [4,16,-2,0,9.25,-1.5,0,8.5,1.5,0,8.5,2,0,9.25],
// 4 16 3.25 0 5.75 -3.25 0 5.75 -5.25 0 4.3 5.25 0 4.3
  [4,16,3.25,0,5.75,-3.25,0,5.75,-5.25,0,4.3,5.25,0,4.3],
// 4 16 -5 0 3.8 -4.75 0 3.25 4.75 0 3.25 5 0 3.8
  [4,16,-5,0,3.8,-4.75,0,3.25,4.75,0,3.25,5,0,3.8],
// 4 16 -1.6 0 -8.1 -.5 0 -9.25 .5 0 -9.25 1.6 0 -8.1
  [4,16,-1.6,0,-8.1,-.5,0,-9.25,.5,0,-9.25,1.6,0,-8.1],
// 4 16 5.75 0 -9.25 7.75 0 -9.25 9.25 0 -7.75 9.25 0 -6.25
  [4,16,5.75,0,-9.25,7.75,0,-9.25,9.25,0,-7.75,9.25,0,-6.25],
// 4 16 4.1 0 -9.25 4 0 -9.15 3.25 0 -9.15 3.25 0 -9.25
  [4,16,4.1,0,-9.25,4,0,-9.15,3.25,0,-9.15,3.25,0,-9.25],
// 3 16 1.25 0 -9.25 2.25 0 -9.25 2.25 0 -9.15
  [3,16,1.25,0,-9.25,2.25,0,-9.25,2.25,0,-9.15],
// 4 16 1.25 0 -9.25 2.25 0 -9.15 3 0 -8.7 2.25 0 -8.3
  [4,16,1.25,0,-9.25,2.25,0,-9.15,3,0,-8.7,2.25,0,-8.3],
// 3 16 3.25 0 -8.2 3.75 0 -8.25 9.25 0 -3.25
  [3,16,3.25,0,-8.2,3.75,0,-8.25,9.25,0,-3.25],
// 4 16 9.25 0 -3.25 9.25 0 -2 3.1 0 -7.9 3.25 0 -8.2
  [4,16,9.25,0,-3.25,9.25,0,-2,3.1,0,-7.9,3.25,0,-8.2],
// 4 16 2.75 0 -7.5 9.25 0 -1.25 9.25 0 5.75 2 0 -5.25
  [4,16,2.75,0,-7.5,9.25,0,-1.25,9.25,0,5.75,2,0,-5.25],
// 4 16 2.75 0 -7.5 2 0 -5.25 .25 0 -5.25 .25 0 -7.5
  [4,16,2.75,0,-7.5,2,0,-5.25,.25,0,-5.25,.25,0,-7.5],
// 4 16 9.25 0 6.75 9.25 0 7.75 5.75 0 2.5 5.75 0 1.5
  [4,16,9.25,0,6.75,9.25,0,7.75,5.75,0,2.5,5.75,0,1.5],
// 4 16 5.75 0 1.5 5.75 0 2.5 5 0 3.8 4.75 0 3.25
  [4,16,5.75,0,1.5,5.75,0,2.5,5,0,3.8,4.75,0,3.25],
// 3 16 9.25 0 8.75 5.25 0 4.3 5.75 0 3.5
  [3,16,9.25,0,8.75,5.25,0,4.3,5.75,0,3.5],
// 4 16 5.25 0 4.3 9.25 0 8.75 5.25 0 9.25 3.25 0 5.75
  [4,16,5.25,0,4.3,9.25,0,8.75,5.25,0,9.25,3.25,0,5.75],
// 3 16 -10 0 10 -9.25 0 8.75 -5.25 0 9.25
  [3,16,-10,0,10,-9.25,0,8.75,-5.25,0,9.25],
// 3 16 -10 0 10 -5.25 0 9.25 -4.5 0 9.25
  [3,16,-10,0,10,-5.25,0,9.25,-4.5,0,9.25],
// 3 16 -10 0 10 -4.5 0 9.25 -2.75 0 9.25
  [3,16,-10,0,10,-4.5,0,9.25,-2.75,0,9.25],
// 3 16 -2.75 0 9.25 -2 0 9.25 -10 0 10
  [3,16,-2.75,0,9.25,-2,0,9.25,-10,0,10],
// 4 16 -10 0 10 -2 0 9.25 2 0 9.25 10 0 10
  [4,16,-10,0,10,-2,0,9.25,2,0,9.25,10,0,10],
// 3 16 10 0 10 2.75 0 9.25 4.5 0 9.25
  [3,16,10,0,10,2.75,0,9.25,4.5,0,9.25],
// 3 16 10 0 10 2 0 9.25 2.75 0 9.25
  [3,16,10,0,10,2,0,9.25,2.75,0,9.25],
// 3 16 10 0 10 4.5 0 9.25 5.25 0 9.25
  [3,16,10,0,10,4.5,0,9.25,5.25,0,9.25],
// 3 16 10 0 10 5.25 0 9.25 9.25 0 8.75
  [3,16,10,0,10,5.25,0,9.25,9.25,0,8.75],
// 3 16 10 0 10 9.25 0 8.75 9.25 0 7.75
  [3,16,10,0,10,9.25,0,8.75,9.25,0,7.75],
// 3 16 10 0 10 9.25 0 7.75 9.25 0 6.75
  [3,16,10,0,10,9.25,0,7.75,9.25,0,6.75],
// 3 16 10 0 10 9.25 0 6.75 9.25 0 5.75
  [3,16,10,0,10,9.25,0,6.75,9.25,0,5.75],
// 4 16 10 0 10 9.25 0 5.75 9.25 0 -1.25 10 0 -10
  [4,16,10,0,10,9.25,0,5.75,9.25,0,-1.25,10,0,-10],
// 3 16 10 0 -10 9.25 0 -1.25 9.25 0 -2
  [3,16,10,0,-10,9.25,0,-1.25,9.25,0,-2],
// 3 16 10 0 -10 9.25 0 -2 9.25 0 -3.25
  [3,16,10,0,-10,9.25,0,-2,9.25,0,-3.25],
// 3 16 10 0 -10 9.25 0 -3.25 9.25 0 -4
  [3,16,10,0,-10,9.25,0,-3.25,9.25,0,-4],
// 3 16 10 0 -10 9.25 0 -4 9.25 0 -4.5
  [3,16,10,0,-10,9.25,0,-4,9.25,0,-4.5],
// 3 16 10 0 -10 9.25 0 -4.5 9.25 0 -5
  [3,16,10,0,-10,9.25,0,-4.5,9.25,0,-5],
// 3 16 10 0 -10 9.25 0 -5 9.25 0 -5.5
  [3,16,10,0,-10,9.25,0,-5,9.25,0,-5.5],
// 3 16 10 0 -10 9.25 0 -5.5 9.25 0 -6.25
  [3,16,10,0,-10,9.25,0,-5.5,9.25,0,-6.25],
// 3 16 10 0 -10 9.25 0 -6.25 9.25 0 -7.75
  [3,16,10,0,-10,9.25,0,-6.25,9.25,0,-7.75],
// 3 16 10 0 -10 9.25 0 -7.75 9.25 0 -8.5
  [3,16,10,0,-10,9.25,0,-7.75,9.25,0,-8.5],
// 3 16 10 0 -10 9.25 0 -8.5 9.25 0 -9.25
  [3,16,10,0,-10,9.25,0,-8.5,9.25,0,-9.25],
// 3 16 -9.25 0 7.75 -9.25 0 8.75 -10 0 10
  [3,16,-9.25,0,7.75,-9.25,0,8.75,-10,0,10],
// 3 16 -9.25 0 7.75 -10 0 10 -9.25 0 6.75
  [3,16,-9.25,0,7.75,-10,0,10,-9.25,0,6.75],
// 3 16 -9.25 0 6.75 -10 0 10 -9.25 0 5.75
  [3,16,-9.25,0,6.75,-10,0,10,-9.25,0,5.75],
// 4 16 -9.25 0 -1.25 -9.25 0 5.75 -10 0 10 -10 0 -10
  [4,16,-9.25,0,-1.25,-9.25,0,5.75,-10,0,10,-10,0,-10],
// 3 16 -9.25 0 -1.25 -10 0 -10 -9.25 0 -2
  [3,16,-9.25,0,-1.25,-10,0,-10,-9.25,0,-2],
// 3 16 -9.25 0 -2 -10 0 -10 -9.25 0 -3.25
  [3,16,-9.25,0,-2,-10,0,-10,-9.25,0,-3.25],
// 3 16 -9.25 0 -3.25 -10 0 -10 -9.25 0 -4
  [3,16,-9.25,0,-3.25,-10,0,-10,-9.25,0,-4],
// 3 16 -9.25 0 -4 -10 0 -10 -9.25 0 -4.5
  [3,16,-9.25,0,-4,-10,0,-10,-9.25,0,-4.5],
// 3 16 -9.25 0 -4.5 -10 0 -10 -9.25 0 -5
  [3,16,-9.25,0,-4.5,-10,0,-10,-9.25,0,-5],
// 3 16 -9.25 0 -5 -10 0 -10 -9.25 0 -5.5
  [3,16,-9.25,0,-5,-10,0,-10,-9.25,0,-5.5],
// 3 16 -9.25 0 -5.5 -10 0 -10 -9.25 0 -6.25
  [3,16,-9.25,0,-5.5,-10,0,-10,-9.25,0,-6.25],
// 3 16 -9.25 0 -6.25 -10 0 -10 -9.25 0 -7.75
  [3,16,-9.25,0,-6.25,-10,0,-10,-9.25,0,-7.75],
// 3 16 -9.25 0 -7.75 -10 0 -10 -9.25 0 -8.5
  [3,16,-9.25,0,-7.75,-10,0,-10,-9.25,0,-8.5],
// 3 16 -9.25 0 -8.5 -10 0 -10 -9.25 0 -9.25
  [3,16,-9.25,0,-8.5,-10,0,-10,-9.25,0,-9.25],
// 3 16 -9.25 0 -9.25 -10 0 -10 -8.5 0 -9.25
  [3,16,-9.25,0,-9.25,-10,0,-10,-8.5,0,-9.25],
// 3 16 -8.5 0 -9.25 -10 0 -10 -7.75 0 -9.25
  [3,16,-8.5,0,-9.25,-10,0,-10,-7.75,0,-9.25],
// 3 16 -7.75 0 -9.25 -10 0 -10 -5.75 0 -9.25
  [3,16,-7.75,0,-9.25,-10,0,-10,-5.75,0,-9.25],
// 3 16 -5 0 -9.25 -5.75 0 -9.25 -10 0 -10
  [3,16,-5,0,-9.25,-5.75,0,-9.25,-10,0,-10],
// 3 16 -10 0 -10 -4.1 0 -9.25 -5 0 -9.25
  [3,16,-10,0,-10,-4.1,0,-9.25,-5,0,-9.25],
// 3 16 -4.1 0 -9.25 -10 0 -10 -3.25 0 -9.25
  [3,16,-4.1,0,-9.25,-10,0,-10,-3.25,0,-9.25],
// 3 16 -3.25 0 -9.25 -10 0 -10 -2.25 0 -9.25
  [3,16,-3.25,0,-9.25,-10,0,-10,-2.25,0,-9.25],
// 3 16 -2.25 0 -9.25 -10 0 -10 -1.25 0 -9.25
  [3,16,-2.25,0,-9.25,-10,0,-10,-1.25,0,-9.25],
// 3 16 -1.25 0 -9.25 -10 0 -10 -.5 0 -9.25
  [3,16,-1.25,0,-9.25,-10,0,-10,-.5,0,-9.25],
// 4 16 .5 0 -9.25 -.5 0 -9.25 -10 0 -10 10 0 -10
  [4,16,.5,0,-9.25,-.5,0,-9.25,-10,0,-10,10,0,-10],
// 3 16 .5 0 -9.25 10 0 -10 1.25 0 -9.25
  [3,16,.5,0,-9.25,10,0,-10,1.25,0,-9.25],
// 3 16 1.25 0 -9.25 10 0 -10 2.25 0 -9.25
  [3,16,1.25,0,-9.25,10,0,-10,2.25,0,-9.25],
// 3 16 2.25 0 -9.25 10 0 -10 3.25 0 -9.25
  [3,16,2.25,0,-9.25,10,0,-10,3.25,0,-9.25],
// 3 16 3.25 0 -9.25 10 0 -10 4.1 0 -9.25
  [3,16,3.25,0,-9.25,10,0,-10,4.1,0,-9.25],
// 3 16 5 0 -9.25 4.1 0 -9.25 10 0 -10
  [3,16,5,0,-9.25,4.1,0,-9.25,10,0,-10],
// 3 16 10 0 -10 5.75 0 -9.25 5 0 -9.25
  [3,16,10,0,-10,5.75,0,-9.25,5,0,-9.25],
// 3 16 5.75 0 -9.25 10 0 -10 7.75 0 -9.25
  [3,16,5.75,0,-9.25,10,0,-10,7.75,0,-9.25],
// 3 16 7.75 0 -9.25 10 0 -10 8.5 0 -9.25
  [3,16,7.75,0,-9.25,10,0,-10,8.5,0,-9.25],
// 3 16 8.5 0 -9.25 10 0 -10 9.25 0 -9.25
  [3,16,8.5,0,-9.25,10,0,-10,9.25,0,-9.25],
];
makepoly(ldraw_lib__3070bpb0(), line=0.2);
